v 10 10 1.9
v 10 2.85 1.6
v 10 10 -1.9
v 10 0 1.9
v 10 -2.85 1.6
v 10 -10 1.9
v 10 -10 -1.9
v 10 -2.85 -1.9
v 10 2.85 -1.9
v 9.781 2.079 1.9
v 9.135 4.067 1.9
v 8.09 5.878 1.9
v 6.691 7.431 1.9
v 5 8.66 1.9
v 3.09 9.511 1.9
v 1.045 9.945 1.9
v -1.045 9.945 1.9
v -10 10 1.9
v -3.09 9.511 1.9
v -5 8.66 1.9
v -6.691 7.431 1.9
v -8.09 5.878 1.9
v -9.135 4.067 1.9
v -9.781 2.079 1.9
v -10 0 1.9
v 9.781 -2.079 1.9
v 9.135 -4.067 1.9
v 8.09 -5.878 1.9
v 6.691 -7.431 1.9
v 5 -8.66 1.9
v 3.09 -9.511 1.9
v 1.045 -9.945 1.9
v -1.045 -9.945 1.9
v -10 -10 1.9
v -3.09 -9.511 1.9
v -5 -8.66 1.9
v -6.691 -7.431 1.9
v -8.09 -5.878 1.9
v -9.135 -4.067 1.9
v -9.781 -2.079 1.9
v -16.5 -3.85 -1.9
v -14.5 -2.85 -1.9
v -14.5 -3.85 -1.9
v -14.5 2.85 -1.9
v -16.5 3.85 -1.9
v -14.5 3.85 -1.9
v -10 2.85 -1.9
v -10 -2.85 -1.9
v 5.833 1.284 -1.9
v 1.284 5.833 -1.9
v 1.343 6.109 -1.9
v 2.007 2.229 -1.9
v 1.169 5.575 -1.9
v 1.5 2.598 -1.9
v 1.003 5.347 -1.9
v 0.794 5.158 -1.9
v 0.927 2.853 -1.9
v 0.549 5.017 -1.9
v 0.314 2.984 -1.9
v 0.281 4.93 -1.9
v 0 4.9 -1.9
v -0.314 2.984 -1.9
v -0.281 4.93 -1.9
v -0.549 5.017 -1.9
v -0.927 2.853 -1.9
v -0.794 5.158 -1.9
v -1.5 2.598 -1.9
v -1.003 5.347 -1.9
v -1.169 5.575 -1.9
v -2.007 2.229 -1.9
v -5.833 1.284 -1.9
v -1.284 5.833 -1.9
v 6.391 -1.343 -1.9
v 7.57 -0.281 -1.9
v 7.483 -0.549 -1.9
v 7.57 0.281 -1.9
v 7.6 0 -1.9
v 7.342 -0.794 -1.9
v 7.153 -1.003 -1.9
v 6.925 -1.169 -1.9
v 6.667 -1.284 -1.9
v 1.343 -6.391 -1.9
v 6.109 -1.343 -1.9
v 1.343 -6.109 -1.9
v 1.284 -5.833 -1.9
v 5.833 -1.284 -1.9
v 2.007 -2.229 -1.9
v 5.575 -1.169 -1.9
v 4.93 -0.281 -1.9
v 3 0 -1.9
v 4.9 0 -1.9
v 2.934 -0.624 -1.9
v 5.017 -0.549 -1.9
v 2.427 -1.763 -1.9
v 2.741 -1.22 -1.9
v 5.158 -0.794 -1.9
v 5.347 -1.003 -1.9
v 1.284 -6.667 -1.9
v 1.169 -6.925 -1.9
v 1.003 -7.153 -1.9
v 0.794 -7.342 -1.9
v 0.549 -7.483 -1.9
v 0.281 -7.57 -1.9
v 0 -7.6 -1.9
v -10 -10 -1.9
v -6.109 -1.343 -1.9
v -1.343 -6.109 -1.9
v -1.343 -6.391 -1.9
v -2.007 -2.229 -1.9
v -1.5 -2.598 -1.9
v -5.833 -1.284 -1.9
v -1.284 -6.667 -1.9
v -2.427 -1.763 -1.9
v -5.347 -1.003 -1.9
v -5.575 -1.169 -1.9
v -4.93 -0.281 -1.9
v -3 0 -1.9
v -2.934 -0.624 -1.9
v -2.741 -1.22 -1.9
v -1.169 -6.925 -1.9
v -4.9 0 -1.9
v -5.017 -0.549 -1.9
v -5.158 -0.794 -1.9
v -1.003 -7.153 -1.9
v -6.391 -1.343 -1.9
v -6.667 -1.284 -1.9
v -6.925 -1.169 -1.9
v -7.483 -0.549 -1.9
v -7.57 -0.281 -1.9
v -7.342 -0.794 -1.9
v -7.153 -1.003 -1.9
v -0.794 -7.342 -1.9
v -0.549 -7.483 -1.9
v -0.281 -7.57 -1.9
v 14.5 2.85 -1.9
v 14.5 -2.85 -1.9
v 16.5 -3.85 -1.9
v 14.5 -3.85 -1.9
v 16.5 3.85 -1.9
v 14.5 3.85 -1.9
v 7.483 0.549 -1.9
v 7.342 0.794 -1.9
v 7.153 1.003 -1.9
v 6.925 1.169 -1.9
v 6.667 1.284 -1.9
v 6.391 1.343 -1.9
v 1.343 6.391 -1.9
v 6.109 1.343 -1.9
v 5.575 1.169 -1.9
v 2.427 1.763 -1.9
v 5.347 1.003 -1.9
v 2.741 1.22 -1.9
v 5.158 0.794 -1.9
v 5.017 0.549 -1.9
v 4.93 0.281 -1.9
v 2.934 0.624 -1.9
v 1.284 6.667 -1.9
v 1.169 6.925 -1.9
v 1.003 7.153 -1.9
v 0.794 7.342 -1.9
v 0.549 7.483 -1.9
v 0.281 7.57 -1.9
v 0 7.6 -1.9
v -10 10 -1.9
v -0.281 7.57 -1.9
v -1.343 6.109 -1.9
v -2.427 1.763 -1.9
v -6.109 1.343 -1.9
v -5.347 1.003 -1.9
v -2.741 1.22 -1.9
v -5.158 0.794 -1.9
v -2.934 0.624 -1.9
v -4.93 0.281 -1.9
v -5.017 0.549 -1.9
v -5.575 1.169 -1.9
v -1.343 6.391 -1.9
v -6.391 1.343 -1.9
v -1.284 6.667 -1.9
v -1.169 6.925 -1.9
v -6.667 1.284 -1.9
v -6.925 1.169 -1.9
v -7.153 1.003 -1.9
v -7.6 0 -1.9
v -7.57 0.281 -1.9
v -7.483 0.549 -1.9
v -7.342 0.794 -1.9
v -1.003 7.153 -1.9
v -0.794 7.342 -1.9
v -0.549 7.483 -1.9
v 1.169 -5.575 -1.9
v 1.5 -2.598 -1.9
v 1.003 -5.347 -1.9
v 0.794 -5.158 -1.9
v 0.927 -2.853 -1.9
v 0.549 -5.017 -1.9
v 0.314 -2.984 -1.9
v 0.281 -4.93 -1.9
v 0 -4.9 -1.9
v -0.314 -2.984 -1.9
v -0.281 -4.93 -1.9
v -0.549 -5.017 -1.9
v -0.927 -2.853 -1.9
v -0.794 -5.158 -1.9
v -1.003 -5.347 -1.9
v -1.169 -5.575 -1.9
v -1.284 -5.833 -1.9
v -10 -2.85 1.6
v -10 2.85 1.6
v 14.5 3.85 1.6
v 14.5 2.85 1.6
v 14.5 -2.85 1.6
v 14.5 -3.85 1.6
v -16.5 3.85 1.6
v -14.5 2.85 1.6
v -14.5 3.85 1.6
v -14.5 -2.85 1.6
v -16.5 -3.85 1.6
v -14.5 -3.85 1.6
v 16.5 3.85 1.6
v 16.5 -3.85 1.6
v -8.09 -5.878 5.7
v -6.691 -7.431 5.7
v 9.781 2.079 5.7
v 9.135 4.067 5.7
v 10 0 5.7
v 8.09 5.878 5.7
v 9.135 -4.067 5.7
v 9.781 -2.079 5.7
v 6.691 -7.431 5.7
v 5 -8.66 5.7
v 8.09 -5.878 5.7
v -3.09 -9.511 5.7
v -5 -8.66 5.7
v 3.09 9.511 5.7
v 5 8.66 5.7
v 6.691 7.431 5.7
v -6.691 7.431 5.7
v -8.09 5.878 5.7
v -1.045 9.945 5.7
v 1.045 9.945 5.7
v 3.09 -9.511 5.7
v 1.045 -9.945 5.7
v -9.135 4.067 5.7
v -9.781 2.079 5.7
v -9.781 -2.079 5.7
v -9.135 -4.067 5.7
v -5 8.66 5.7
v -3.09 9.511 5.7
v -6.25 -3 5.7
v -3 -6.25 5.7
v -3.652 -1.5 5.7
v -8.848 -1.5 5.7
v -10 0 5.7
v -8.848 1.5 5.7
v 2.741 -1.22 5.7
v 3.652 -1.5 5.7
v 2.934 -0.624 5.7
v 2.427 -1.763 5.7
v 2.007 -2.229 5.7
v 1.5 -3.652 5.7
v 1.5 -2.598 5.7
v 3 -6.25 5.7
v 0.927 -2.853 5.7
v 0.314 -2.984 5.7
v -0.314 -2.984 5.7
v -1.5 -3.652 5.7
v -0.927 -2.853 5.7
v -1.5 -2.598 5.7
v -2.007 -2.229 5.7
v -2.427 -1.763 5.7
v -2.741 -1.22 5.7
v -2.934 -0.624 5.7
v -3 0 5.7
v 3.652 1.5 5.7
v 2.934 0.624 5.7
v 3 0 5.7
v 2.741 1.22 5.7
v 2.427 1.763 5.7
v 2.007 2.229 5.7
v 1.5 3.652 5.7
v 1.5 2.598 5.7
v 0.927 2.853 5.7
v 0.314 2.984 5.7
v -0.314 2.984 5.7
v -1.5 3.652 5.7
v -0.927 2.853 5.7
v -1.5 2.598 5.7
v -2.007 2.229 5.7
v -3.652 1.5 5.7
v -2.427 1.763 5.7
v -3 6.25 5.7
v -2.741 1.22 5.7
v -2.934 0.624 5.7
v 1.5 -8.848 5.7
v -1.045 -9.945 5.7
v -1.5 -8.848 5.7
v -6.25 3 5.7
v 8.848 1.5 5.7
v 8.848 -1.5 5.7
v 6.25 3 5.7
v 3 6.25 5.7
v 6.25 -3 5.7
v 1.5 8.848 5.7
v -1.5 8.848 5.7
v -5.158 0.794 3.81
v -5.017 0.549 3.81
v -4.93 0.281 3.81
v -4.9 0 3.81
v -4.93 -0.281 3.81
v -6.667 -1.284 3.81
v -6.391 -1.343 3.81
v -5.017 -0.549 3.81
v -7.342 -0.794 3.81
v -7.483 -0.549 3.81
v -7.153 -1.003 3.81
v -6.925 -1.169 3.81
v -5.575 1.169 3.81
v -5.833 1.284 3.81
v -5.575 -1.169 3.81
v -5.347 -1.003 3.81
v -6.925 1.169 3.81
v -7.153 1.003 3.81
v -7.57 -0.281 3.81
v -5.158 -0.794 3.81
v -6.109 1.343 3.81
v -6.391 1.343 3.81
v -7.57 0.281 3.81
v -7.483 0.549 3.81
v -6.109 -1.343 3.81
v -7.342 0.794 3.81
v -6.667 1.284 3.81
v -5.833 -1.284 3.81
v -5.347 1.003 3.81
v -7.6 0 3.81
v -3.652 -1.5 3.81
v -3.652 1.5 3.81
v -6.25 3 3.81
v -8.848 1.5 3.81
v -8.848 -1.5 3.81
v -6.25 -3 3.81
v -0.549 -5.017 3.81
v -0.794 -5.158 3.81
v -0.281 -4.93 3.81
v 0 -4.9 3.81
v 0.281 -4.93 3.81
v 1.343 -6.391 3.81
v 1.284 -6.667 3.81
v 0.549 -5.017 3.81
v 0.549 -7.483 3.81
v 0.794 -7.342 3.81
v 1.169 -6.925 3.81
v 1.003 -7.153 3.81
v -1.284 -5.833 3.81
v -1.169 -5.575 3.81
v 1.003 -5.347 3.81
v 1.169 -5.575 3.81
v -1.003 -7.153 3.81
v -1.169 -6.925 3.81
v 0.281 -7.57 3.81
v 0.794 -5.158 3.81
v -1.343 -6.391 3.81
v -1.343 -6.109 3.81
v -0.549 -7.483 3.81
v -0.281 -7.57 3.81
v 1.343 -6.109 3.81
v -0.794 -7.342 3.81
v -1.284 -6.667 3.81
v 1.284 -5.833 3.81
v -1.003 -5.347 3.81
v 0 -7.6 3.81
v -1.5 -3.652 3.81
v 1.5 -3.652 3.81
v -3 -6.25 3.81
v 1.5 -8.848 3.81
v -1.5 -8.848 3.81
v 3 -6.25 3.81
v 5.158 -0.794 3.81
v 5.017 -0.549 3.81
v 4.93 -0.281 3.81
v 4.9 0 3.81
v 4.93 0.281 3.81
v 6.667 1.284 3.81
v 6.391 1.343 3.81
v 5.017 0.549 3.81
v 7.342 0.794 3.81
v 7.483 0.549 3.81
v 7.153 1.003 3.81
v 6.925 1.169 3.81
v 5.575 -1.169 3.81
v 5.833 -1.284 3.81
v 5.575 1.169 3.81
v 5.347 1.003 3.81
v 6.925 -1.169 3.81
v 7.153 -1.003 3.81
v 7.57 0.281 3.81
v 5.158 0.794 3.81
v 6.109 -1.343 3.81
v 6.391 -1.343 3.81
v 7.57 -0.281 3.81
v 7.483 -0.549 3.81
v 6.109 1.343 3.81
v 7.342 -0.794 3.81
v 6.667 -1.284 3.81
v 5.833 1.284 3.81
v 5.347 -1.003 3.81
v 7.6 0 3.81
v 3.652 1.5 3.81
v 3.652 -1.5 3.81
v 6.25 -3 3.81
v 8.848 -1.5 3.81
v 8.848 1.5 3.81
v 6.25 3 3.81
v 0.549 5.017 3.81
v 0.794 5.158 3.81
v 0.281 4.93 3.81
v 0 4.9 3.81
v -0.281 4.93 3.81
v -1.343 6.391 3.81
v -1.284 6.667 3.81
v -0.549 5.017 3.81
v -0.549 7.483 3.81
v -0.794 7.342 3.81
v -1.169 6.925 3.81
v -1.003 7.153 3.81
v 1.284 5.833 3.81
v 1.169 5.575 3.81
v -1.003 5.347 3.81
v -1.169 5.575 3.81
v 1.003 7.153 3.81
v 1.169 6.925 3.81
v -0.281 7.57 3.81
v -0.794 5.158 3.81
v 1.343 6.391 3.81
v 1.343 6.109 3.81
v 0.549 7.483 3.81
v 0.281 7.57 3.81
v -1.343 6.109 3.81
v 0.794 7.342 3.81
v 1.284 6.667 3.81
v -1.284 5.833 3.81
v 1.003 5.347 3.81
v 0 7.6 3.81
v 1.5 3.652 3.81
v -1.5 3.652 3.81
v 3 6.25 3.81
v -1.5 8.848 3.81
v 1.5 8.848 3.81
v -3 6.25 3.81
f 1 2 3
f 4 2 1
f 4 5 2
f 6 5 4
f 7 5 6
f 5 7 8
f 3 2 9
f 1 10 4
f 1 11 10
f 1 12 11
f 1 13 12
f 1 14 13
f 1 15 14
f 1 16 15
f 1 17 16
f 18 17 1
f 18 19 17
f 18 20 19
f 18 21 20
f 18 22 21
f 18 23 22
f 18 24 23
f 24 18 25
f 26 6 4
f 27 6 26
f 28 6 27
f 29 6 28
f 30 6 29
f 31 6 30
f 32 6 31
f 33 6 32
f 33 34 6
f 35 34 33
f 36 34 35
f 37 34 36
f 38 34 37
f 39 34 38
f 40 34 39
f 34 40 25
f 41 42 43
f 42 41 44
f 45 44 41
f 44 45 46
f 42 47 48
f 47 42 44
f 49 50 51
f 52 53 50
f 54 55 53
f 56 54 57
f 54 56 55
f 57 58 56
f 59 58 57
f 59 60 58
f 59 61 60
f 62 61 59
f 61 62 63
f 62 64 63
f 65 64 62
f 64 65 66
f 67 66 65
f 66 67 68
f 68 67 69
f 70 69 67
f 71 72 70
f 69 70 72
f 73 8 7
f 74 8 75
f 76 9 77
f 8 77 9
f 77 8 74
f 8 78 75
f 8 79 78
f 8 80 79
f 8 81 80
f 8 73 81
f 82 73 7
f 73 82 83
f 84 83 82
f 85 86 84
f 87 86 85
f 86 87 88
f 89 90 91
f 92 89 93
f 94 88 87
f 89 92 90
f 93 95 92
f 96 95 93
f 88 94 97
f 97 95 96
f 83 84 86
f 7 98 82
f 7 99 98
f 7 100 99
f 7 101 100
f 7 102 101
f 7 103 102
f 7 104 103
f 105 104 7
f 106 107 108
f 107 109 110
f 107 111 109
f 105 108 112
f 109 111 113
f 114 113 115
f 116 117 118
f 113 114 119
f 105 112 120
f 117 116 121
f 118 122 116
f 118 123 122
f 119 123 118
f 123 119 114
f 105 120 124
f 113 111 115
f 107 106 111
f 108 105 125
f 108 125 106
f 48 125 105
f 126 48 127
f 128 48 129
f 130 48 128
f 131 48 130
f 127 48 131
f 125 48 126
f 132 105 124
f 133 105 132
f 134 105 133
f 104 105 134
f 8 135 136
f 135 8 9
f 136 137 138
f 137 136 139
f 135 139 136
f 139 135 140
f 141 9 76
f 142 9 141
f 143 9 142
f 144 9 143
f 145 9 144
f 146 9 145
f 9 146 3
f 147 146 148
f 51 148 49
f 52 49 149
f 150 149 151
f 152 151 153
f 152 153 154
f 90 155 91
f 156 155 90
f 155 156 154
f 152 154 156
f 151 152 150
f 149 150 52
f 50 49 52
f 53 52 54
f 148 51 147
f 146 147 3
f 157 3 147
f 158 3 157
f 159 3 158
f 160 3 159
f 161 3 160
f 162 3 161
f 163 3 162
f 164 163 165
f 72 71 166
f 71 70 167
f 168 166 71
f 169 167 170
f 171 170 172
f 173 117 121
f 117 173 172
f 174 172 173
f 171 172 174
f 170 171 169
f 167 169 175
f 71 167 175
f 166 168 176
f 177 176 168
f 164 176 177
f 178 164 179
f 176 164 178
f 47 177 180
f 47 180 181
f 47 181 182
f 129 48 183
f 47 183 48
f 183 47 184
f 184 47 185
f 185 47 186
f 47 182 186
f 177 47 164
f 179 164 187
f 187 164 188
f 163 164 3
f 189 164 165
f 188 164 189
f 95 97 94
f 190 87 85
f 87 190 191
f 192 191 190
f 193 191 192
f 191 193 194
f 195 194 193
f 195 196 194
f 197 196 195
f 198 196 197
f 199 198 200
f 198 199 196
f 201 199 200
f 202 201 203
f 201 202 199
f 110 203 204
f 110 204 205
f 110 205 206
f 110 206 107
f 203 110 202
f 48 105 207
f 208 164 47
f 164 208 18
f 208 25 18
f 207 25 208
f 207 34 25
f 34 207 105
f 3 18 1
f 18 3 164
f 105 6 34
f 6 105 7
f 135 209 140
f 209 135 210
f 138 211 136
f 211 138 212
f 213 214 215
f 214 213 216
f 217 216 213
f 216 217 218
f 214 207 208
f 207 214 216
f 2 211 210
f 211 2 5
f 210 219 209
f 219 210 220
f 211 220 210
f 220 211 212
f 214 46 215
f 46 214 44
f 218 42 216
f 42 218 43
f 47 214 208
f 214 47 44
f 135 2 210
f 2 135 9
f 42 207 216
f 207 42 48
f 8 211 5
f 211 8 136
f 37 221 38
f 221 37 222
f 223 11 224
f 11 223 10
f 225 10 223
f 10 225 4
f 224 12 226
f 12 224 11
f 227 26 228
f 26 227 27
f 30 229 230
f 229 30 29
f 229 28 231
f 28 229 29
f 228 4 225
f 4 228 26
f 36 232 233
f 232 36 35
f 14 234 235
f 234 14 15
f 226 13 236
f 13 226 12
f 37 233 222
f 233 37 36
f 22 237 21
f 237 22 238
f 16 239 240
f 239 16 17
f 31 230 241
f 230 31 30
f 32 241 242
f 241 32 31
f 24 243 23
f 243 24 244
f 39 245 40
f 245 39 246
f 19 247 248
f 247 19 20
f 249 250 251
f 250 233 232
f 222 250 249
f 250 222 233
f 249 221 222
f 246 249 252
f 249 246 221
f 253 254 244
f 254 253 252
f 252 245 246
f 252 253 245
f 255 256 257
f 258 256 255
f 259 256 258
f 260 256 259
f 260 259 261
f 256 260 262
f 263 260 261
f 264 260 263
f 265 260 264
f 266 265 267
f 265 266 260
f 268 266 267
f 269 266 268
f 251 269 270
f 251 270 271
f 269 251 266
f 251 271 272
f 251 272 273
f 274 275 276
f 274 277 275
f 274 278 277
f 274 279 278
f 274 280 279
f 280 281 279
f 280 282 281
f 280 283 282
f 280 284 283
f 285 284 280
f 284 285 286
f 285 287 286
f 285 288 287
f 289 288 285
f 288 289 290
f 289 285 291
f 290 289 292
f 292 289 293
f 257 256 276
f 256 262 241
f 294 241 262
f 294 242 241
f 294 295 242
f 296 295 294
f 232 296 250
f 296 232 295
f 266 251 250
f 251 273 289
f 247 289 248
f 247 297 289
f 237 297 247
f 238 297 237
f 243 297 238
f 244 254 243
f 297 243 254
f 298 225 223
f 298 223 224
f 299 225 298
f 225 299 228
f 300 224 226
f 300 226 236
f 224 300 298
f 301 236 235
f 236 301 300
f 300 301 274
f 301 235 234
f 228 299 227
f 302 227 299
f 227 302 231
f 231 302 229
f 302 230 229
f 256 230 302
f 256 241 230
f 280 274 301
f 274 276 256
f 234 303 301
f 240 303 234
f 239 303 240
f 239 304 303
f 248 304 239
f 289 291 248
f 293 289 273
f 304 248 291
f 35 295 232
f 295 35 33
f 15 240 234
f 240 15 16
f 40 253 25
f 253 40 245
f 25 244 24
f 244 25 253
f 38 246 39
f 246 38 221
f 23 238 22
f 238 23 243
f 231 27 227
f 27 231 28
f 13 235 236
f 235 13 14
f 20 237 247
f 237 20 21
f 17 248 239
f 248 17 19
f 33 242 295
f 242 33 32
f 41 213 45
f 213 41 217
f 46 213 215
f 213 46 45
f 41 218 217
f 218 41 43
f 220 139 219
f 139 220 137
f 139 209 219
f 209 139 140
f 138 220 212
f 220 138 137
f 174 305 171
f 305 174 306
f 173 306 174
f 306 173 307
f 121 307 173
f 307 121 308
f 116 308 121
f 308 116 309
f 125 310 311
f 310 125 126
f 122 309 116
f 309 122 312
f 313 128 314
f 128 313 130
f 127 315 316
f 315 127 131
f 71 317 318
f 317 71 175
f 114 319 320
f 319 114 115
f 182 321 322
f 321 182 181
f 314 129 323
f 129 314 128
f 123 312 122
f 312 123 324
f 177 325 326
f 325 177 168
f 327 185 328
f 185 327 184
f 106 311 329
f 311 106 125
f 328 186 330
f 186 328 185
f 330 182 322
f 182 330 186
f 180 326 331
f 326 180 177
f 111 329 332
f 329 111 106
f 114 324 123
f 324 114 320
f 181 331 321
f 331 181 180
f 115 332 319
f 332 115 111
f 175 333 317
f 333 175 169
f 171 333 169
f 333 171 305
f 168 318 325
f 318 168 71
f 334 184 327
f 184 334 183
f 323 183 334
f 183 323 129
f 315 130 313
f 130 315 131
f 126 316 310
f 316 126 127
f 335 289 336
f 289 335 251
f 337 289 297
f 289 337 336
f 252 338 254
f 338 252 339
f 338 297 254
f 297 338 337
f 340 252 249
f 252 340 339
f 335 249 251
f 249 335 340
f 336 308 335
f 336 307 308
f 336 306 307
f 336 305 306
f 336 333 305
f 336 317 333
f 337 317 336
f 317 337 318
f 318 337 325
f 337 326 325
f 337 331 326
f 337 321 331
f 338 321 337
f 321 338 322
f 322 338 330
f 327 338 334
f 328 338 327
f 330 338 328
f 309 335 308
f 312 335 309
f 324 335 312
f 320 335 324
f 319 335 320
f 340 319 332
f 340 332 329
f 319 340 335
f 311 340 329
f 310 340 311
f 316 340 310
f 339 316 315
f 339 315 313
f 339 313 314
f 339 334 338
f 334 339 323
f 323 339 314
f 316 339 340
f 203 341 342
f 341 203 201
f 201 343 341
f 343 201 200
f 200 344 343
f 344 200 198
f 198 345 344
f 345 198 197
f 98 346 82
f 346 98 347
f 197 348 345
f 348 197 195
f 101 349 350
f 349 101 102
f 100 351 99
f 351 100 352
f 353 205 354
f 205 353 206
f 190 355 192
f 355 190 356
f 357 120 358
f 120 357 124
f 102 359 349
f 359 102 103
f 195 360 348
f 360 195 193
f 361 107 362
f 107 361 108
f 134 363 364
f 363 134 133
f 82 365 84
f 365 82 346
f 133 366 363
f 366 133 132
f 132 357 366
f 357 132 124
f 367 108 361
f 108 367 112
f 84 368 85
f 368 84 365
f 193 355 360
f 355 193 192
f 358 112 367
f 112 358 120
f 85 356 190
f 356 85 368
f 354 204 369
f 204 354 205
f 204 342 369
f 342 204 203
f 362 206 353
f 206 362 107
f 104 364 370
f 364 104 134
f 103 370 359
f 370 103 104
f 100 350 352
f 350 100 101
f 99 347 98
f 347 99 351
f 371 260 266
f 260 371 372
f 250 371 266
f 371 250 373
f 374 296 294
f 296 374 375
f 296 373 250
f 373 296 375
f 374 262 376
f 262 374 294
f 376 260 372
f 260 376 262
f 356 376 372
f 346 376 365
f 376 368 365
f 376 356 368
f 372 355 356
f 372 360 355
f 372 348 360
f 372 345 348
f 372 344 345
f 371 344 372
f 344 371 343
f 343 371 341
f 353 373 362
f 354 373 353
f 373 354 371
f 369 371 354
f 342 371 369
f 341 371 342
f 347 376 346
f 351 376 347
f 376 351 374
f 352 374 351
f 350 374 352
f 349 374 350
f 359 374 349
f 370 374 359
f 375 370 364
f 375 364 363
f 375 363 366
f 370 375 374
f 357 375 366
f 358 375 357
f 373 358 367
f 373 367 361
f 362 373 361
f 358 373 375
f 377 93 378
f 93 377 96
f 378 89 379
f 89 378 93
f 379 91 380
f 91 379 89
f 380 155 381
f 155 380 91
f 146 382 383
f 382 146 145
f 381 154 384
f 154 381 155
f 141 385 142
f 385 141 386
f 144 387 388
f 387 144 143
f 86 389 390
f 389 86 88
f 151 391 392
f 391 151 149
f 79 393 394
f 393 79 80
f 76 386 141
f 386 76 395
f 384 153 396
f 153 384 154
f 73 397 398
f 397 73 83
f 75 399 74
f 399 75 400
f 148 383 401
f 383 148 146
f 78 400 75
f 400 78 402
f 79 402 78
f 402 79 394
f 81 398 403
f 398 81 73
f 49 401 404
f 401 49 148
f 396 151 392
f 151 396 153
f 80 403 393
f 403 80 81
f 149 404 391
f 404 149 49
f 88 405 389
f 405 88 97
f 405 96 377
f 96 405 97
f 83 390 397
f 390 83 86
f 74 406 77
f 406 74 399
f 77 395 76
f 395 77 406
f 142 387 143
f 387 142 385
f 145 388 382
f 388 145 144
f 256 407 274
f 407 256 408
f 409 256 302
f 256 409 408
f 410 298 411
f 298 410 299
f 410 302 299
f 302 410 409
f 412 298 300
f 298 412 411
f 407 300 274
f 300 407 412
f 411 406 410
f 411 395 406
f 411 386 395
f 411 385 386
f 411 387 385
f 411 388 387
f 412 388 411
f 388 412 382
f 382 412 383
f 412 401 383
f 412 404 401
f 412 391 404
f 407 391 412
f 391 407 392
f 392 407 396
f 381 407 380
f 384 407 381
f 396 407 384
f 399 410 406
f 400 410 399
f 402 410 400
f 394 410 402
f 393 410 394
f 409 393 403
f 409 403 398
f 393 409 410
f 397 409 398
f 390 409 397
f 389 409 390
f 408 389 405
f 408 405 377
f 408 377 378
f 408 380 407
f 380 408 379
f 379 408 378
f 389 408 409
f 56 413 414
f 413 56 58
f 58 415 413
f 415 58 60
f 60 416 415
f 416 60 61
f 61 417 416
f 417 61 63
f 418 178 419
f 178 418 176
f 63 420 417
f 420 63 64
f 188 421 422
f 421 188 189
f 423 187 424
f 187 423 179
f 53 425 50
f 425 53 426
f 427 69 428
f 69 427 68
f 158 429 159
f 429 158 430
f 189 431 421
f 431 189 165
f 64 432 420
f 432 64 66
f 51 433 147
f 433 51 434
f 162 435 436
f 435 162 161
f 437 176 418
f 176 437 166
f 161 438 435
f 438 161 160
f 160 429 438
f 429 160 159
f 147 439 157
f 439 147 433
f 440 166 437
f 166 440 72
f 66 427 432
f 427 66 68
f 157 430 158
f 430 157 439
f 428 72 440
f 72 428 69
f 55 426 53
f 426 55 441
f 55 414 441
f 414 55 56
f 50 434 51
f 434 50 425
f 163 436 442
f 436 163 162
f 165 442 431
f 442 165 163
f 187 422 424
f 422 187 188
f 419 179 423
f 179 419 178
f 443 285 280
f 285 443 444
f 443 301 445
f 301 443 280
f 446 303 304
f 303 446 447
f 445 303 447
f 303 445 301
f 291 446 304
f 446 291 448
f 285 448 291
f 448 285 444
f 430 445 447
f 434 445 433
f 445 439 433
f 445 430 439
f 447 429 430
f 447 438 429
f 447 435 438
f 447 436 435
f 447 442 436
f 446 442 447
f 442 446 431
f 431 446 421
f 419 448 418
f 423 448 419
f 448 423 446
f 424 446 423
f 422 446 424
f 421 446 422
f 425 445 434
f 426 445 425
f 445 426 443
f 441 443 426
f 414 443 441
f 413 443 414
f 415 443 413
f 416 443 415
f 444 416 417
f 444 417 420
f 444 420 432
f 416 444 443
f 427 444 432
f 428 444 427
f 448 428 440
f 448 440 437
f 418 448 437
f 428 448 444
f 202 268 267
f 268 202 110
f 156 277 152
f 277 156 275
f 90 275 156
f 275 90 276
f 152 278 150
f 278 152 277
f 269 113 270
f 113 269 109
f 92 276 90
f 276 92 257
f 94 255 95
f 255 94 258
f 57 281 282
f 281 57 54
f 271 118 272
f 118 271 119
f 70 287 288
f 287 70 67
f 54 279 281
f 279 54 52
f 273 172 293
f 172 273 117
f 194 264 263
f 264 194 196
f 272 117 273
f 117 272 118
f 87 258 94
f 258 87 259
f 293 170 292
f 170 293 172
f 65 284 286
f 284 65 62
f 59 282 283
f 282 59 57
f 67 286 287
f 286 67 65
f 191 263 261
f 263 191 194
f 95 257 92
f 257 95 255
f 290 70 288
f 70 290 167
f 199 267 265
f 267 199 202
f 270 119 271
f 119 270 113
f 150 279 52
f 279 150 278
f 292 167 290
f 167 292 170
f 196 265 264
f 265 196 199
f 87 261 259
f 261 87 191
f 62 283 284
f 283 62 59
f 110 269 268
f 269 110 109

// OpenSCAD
$fn = 30;
SPACER_LENGTH = 6;

ARM_THICKNESS = 3.8;

ARMS_SPACING = 20;
ARM_WIDTH = 20;

module spacer(length, width, thickness, support = false) {

    BLOCKER_THICKNESS = 2;
    SPACE = 0.3;
    CLEAR = 0.7;

    MAIN_HOLE_DIAMETER = 3;

    SCREW_DIAMETER = 2.7;
    NUT_DIAMETER = 6;
    NUT_HEIGHT = 1.9;

    difference() {
        union() {
            cube([ length, width, thickness ], center = true);

            translate([0, 0, - SPACE / 2]) {
                cube(size = [ length + thickness * 2 + CLEAR * 2, SPACER_LENGTH - SPACE, ARM_THICKNESS - SPACE ], center = true);
            }

            if (support) {
                translate([ 0, 0, thickness / 2]) {
                    cylinder(r = 10, h = thickness);
                }
            } else {
                translate([ 0, 0, thickness ]) {
                    //%cube(size = [ length, SPACER_LENGTH - SPACE, thickness ], center = true);
                }

                translate([ - length / 2, 0, thickness / 2 - 0.01 ]) {
                    rotate([90, 0, 90])
                    linear_extrude(height = length) {
                        polygon([[-1.5,0],[-(SPACER_LENGTH - SPACE) / 2, thickness + 0.01],[(SPACER_LENGTH - SPACE) / 2,thickness + 0.01],[1.5,0]]);
                    }
                }

                translate([ 0, 0, thickness / 2]) {
                    cylinder(r = 5, h = thickness);
                }
            }

            // Blocker
            translate([ - (length + thickness * 2) / 2 - BLOCKER_THICKNESS / 2 - CLEAR, 0, -SPACE / 2 ]) {
                cube(size = [ BLOCKER_THICKNESS, SPACER_LENGTH - SPACE + 2, ARM_THICKNESS - SPACE ], center = true);
            }

            translate([ (length + thickness * 2) / 2 + BLOCKER_THICKNESS / 2 + CLEAR, 0, -SPACE / 2 ]) {
                cube(size = [ BLOCKER_THICKNESS, SPACER_LENGTH - SPACE + 2, ARM_THICKNESS - SPACE ], center = true);
            }
        }

        // Main hole
        translate([ 0, 0, -10]) {
            cylinder(r = MAIN_HOLE_DIAMETER, h = 20);
        }

        if (support) {
            // Small hole
            for (i = [0 : 3]) {
                rotate([0, 0, i * 90]) {

                    //translate([-(length / 4 + MAIN_HOLE_DIAMETER / 2), 0, -5]) {
                    translate([-(length / 4 + 1.25), 0, -5]) {
                        cylinder(r = SCREW_DIAMETER / 2, h = 20);

                        // Nut
                        translate([0, 0, ARM_THICKNESS + 5 + 0.01]) {
                            rotate([0, 0, 90])
                                cylinder(r = NUT_DIAMETER / 2, h = NUT_HEIGHT, $fn = 6);
                        }
                    }
                }
            }
        }
    }
}

if (1) {
    // Small
    spacer(ARMS_SPACING, ARM_WIDTH, ARM_THICKNESS, true);
    //spacer(ARMS_SPACING, ARM_WIDTH, ARM_THICKNESS, false);

    // Large
    //spacer(ARMS_SPACING + ARM_THICKNESS * 2 - 1, 15, ARM_THICKNESS);
}
